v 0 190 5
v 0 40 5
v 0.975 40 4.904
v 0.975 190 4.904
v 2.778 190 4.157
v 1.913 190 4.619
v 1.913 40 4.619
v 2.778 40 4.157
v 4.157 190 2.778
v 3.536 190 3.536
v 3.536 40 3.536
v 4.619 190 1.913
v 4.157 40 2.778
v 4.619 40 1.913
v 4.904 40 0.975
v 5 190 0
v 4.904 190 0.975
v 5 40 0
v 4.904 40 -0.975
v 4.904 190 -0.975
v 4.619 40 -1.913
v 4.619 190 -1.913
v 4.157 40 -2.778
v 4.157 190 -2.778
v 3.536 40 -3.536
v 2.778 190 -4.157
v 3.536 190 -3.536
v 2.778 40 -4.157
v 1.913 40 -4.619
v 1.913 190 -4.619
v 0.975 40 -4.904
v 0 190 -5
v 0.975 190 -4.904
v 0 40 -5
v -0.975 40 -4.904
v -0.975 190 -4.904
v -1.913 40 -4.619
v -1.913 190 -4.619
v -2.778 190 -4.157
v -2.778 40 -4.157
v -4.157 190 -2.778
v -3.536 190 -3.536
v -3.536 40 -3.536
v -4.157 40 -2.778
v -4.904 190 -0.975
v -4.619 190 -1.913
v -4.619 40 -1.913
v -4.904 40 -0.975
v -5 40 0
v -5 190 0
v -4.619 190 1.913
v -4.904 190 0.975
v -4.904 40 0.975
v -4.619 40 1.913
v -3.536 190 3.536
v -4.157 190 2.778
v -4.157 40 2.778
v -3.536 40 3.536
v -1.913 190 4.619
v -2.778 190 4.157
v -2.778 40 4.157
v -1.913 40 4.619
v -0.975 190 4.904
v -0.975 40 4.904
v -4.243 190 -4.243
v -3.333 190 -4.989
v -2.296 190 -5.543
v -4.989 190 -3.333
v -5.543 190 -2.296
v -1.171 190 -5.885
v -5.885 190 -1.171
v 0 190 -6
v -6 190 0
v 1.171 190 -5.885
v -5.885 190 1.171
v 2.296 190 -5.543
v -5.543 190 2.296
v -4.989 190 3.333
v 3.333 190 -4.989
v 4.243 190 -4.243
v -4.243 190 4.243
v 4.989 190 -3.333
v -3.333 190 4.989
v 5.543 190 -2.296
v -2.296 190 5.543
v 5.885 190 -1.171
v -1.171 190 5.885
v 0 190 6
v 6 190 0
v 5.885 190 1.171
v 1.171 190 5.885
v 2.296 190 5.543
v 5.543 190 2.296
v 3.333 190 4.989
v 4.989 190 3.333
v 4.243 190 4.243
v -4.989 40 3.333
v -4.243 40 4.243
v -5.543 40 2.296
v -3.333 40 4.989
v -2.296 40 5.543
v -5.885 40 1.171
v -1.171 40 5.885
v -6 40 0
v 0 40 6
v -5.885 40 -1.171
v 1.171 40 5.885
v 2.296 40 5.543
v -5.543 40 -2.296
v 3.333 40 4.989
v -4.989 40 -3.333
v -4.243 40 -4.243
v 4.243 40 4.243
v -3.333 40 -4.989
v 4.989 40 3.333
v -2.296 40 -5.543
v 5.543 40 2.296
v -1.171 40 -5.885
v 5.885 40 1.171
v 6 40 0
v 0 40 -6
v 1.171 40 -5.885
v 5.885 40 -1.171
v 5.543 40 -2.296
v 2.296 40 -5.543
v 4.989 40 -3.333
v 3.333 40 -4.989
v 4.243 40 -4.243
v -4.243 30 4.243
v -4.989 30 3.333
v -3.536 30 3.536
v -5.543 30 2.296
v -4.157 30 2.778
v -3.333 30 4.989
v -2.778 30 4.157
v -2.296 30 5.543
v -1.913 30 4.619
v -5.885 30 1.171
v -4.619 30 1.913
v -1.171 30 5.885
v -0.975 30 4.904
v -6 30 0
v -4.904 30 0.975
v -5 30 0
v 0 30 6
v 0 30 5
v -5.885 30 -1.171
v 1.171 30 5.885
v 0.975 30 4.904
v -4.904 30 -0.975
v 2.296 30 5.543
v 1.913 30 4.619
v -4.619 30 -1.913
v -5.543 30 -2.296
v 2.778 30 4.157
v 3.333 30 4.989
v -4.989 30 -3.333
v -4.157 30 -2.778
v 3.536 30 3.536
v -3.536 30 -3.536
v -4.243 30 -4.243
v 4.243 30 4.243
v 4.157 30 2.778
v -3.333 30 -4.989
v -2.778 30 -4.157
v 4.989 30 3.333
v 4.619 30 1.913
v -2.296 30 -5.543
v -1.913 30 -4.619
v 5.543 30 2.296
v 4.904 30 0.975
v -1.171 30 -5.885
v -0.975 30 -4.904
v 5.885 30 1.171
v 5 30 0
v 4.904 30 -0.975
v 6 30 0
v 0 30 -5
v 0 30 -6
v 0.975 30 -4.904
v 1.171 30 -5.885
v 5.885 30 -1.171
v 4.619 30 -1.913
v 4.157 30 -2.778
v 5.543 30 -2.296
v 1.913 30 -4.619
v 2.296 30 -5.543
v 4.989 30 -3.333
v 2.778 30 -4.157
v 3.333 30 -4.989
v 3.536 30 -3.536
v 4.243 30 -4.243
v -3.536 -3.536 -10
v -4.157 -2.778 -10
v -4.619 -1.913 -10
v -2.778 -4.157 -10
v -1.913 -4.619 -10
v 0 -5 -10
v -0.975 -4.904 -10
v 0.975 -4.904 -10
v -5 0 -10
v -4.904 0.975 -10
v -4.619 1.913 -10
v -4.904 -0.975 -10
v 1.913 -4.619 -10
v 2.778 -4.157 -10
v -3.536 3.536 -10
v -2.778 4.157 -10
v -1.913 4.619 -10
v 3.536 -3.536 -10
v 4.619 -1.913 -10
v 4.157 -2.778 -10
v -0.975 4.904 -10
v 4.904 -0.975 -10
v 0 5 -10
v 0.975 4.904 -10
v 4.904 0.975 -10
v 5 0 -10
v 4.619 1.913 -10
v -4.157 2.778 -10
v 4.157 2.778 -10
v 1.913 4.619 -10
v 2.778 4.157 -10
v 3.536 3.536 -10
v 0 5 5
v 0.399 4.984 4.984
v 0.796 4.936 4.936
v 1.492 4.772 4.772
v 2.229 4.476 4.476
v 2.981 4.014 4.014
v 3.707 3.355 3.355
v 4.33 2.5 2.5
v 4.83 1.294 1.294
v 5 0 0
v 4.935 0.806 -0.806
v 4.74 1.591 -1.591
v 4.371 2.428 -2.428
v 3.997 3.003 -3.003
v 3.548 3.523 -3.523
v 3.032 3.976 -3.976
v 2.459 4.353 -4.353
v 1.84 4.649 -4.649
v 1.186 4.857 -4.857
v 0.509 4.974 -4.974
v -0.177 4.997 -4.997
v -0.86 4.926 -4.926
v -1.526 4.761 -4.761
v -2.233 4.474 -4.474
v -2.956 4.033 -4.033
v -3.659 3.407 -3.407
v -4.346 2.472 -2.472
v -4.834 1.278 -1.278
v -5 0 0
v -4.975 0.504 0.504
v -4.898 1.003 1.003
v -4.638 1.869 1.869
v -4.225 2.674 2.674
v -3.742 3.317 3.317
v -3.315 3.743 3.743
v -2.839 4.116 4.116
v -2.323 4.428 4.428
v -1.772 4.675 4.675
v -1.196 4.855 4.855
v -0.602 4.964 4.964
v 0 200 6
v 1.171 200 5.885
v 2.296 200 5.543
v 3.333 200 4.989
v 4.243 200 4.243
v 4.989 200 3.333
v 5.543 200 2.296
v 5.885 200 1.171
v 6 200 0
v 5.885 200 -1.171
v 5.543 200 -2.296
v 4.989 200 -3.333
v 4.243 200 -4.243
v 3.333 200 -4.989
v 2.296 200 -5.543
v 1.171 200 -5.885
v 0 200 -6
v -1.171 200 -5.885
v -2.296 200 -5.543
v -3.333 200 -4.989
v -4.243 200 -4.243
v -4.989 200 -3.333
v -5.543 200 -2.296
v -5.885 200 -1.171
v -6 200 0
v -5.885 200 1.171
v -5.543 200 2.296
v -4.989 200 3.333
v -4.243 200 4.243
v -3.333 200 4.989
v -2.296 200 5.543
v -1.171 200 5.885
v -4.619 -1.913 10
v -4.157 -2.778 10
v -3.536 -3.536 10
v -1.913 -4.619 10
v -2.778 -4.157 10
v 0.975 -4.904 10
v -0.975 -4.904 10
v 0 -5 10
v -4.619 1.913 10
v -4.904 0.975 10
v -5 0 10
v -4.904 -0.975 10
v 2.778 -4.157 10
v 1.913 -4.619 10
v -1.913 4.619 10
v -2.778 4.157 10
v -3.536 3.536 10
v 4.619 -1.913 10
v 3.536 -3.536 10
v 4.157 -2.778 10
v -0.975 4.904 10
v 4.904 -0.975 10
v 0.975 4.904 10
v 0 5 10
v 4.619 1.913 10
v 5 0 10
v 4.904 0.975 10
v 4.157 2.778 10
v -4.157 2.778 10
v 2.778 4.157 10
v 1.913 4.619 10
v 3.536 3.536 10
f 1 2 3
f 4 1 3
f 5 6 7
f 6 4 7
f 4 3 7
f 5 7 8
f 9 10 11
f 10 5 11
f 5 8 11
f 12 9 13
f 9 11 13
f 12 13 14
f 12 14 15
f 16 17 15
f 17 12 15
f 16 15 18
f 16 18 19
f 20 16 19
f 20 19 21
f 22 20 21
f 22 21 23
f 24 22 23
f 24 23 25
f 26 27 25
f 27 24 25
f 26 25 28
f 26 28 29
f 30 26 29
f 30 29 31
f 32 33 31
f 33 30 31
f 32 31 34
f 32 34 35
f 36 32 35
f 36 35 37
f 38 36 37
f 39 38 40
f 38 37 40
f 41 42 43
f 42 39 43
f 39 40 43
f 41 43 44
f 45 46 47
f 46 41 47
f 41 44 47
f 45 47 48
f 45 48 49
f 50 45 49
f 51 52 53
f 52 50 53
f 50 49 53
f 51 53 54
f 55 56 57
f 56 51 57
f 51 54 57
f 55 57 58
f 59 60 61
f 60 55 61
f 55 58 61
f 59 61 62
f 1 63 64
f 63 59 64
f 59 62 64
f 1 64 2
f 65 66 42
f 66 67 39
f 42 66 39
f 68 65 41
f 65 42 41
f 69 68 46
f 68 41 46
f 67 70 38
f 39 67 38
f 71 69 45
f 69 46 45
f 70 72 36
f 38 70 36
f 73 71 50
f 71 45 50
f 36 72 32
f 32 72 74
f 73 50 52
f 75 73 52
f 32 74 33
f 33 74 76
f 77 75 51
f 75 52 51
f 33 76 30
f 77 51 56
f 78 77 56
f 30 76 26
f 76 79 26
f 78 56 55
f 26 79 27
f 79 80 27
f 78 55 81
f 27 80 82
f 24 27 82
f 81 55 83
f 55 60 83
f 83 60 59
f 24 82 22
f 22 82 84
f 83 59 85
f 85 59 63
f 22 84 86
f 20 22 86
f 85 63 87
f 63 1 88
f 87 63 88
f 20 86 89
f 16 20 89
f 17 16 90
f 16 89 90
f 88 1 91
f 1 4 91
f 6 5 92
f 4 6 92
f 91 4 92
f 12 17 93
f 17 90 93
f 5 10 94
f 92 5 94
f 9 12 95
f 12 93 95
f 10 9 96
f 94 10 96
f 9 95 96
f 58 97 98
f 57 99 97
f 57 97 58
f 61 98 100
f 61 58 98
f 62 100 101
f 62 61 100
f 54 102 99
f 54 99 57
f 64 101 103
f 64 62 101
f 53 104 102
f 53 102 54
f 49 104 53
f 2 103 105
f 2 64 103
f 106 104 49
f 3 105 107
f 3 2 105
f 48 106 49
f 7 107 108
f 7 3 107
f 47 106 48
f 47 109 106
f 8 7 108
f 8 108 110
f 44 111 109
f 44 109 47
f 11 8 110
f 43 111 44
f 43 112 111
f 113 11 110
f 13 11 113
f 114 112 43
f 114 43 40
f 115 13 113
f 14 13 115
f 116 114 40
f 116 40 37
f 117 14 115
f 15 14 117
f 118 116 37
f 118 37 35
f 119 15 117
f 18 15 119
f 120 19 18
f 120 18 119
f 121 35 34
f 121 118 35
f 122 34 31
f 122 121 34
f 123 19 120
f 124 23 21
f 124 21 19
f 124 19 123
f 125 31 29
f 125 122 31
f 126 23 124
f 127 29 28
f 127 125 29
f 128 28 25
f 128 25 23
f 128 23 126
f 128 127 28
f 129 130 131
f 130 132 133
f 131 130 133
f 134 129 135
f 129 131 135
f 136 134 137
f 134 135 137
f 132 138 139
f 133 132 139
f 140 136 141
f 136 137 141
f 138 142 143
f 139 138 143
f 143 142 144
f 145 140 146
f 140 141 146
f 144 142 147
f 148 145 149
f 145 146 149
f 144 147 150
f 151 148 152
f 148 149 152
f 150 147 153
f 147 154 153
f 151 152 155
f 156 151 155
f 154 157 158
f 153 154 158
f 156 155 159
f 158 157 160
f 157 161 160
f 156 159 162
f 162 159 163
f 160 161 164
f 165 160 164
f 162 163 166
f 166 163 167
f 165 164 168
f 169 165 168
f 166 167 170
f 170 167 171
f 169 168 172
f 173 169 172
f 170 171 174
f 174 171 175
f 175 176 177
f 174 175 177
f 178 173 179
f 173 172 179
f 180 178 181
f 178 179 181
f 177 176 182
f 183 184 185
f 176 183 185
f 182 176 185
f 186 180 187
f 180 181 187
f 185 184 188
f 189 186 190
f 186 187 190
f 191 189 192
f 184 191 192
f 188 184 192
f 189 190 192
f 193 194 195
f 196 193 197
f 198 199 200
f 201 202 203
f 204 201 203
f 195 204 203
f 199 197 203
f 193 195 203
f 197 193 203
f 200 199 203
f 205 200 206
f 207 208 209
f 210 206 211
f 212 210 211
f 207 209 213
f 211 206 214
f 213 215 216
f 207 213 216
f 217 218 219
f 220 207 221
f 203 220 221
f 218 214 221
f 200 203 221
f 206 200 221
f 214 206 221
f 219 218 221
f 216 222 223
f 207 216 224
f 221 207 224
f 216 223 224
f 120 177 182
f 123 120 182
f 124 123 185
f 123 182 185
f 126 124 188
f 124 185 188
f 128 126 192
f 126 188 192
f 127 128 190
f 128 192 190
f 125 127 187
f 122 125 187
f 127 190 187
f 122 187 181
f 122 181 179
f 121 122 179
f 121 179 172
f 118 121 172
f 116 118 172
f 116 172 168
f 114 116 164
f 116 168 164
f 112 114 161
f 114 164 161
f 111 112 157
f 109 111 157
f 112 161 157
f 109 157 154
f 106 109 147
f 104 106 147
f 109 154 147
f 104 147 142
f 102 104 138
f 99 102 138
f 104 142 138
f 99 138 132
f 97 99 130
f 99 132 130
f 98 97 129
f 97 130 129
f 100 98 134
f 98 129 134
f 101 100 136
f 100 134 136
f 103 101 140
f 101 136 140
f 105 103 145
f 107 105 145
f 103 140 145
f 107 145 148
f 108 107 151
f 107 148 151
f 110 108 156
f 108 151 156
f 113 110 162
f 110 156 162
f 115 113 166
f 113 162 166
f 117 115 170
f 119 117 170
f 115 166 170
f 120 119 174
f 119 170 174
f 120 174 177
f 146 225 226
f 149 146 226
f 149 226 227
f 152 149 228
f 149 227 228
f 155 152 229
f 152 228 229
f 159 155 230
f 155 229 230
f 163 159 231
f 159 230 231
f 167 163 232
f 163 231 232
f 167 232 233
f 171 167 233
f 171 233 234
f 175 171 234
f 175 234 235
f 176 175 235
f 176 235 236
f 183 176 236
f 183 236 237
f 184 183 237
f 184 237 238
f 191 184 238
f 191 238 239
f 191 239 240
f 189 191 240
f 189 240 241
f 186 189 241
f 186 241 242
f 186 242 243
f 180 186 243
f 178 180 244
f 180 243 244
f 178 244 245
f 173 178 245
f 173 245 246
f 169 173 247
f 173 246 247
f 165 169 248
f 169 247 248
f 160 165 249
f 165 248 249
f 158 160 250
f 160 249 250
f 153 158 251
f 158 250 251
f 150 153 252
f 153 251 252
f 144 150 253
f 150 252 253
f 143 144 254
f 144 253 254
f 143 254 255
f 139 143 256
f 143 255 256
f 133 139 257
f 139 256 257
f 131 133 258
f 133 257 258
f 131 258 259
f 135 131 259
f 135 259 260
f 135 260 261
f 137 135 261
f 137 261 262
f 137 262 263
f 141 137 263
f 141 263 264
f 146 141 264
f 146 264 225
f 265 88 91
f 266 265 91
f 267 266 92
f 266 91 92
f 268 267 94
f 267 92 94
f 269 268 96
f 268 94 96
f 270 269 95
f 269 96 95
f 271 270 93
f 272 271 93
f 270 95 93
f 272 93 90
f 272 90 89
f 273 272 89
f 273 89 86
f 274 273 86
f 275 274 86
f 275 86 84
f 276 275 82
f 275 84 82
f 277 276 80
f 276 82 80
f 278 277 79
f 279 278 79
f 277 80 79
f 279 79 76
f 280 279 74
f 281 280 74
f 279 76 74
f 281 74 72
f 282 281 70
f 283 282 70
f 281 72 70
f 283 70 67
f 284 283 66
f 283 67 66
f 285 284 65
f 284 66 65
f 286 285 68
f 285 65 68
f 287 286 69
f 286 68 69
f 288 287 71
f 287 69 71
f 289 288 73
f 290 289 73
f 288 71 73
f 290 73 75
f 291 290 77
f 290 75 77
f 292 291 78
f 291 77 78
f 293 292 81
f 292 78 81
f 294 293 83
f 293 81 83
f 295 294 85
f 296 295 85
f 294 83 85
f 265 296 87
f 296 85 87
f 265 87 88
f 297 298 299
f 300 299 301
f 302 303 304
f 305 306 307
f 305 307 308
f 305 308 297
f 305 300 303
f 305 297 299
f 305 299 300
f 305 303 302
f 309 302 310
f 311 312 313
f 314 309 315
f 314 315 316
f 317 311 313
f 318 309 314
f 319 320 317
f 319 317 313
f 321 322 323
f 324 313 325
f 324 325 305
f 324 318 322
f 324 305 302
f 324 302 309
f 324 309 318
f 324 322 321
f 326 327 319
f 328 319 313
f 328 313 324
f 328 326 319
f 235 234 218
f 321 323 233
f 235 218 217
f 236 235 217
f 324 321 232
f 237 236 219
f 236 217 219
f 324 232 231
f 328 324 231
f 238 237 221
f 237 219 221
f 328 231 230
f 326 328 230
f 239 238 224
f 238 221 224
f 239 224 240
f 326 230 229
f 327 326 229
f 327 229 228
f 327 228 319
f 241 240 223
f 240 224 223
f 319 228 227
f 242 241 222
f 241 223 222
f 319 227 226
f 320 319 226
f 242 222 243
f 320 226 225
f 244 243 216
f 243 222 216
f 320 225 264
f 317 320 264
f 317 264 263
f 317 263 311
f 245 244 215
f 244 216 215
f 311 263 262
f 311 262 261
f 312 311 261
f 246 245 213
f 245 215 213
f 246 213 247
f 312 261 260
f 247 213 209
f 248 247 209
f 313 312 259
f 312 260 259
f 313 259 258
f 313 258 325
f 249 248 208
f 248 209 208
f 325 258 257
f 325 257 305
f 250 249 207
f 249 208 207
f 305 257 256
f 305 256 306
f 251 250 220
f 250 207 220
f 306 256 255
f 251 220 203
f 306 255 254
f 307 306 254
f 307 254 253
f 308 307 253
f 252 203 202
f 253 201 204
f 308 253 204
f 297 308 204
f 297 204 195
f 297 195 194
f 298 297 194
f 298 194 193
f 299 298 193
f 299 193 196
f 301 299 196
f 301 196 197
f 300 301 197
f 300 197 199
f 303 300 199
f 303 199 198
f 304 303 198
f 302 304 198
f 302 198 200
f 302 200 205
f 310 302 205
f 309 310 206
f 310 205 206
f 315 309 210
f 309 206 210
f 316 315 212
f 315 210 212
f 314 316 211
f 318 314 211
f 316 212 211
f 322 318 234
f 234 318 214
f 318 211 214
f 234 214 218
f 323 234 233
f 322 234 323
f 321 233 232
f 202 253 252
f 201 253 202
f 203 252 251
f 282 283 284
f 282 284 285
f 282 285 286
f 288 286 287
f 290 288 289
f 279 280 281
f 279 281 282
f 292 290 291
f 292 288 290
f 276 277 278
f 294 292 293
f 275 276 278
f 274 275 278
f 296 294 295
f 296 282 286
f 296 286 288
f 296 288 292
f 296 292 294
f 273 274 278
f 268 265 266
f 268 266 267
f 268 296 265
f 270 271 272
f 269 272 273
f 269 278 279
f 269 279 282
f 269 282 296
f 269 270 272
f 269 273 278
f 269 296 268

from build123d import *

# Parameters (mm, degrees)
SKETCH1_R                = 5
BOSS_EXTRUDE1_DEPTH      = 200
BOSS_EXTRUDE2_DEPTH      = 10
BOSS_EXTRUDE2_DEPTH_BACK = 10
SKETCH2_R                = 5
F_3DSKETCH1_R            = 6
BOSS_EXTRUDE3_DEPTH      = 10
BOSS_EXTRUDE4_START      = -10
SKETCH3_R                = 6
BOSS_EXTRUDE4_DEPTH      = 10


with BuildPart() as part:
    # Sketch1 → Boss-Extrude1 (new body)
    with BuildSketch(Plane(origin=(0, 0, 0), x_dir=(1, 0, 0), z_dir=(0, 1, 0))):
        Circle(SKETCH1_R)
    extrude(amount=BOSS_EXTRUDE1_DEPTH)

    # Sketch2 → Boss-Extrude2 (add, two sides: drawn at the far end of the back side and taken through both)
    with BuildSketch(Plane.XY.offset(-BOSS_EXTRUDE2_DEPTH_BACK)):
        Circle(SKETCH2_R)
    extrude(amount=BOSS_EXTRUDE2_DEPTH + BOSS_EXTRUDE2_DEPTH_BACK)

    # 3DSketch1 → Boss-Extrude3 (add)
    with BuildSketch(Plane.ZX.offset(30)):
        Circle(F_3DSKETCH1_R)
    extrude(amount=BOSS_EXTRUDE3_DEPTH)

    # Sketch3 → Boss-Extrude4 (add)
    with BuildSketch(Plane(origin=(0, 200, 0), x_dir=(1, 0, 0), z_dir=(0, 1, 0)).offset(BOSS_EXTRUDE4_START)):
        Circle(SKETCH3_R)
    extrude(amount=BOSS_EXTRUDE4_DEPTH)


solid = part.part
